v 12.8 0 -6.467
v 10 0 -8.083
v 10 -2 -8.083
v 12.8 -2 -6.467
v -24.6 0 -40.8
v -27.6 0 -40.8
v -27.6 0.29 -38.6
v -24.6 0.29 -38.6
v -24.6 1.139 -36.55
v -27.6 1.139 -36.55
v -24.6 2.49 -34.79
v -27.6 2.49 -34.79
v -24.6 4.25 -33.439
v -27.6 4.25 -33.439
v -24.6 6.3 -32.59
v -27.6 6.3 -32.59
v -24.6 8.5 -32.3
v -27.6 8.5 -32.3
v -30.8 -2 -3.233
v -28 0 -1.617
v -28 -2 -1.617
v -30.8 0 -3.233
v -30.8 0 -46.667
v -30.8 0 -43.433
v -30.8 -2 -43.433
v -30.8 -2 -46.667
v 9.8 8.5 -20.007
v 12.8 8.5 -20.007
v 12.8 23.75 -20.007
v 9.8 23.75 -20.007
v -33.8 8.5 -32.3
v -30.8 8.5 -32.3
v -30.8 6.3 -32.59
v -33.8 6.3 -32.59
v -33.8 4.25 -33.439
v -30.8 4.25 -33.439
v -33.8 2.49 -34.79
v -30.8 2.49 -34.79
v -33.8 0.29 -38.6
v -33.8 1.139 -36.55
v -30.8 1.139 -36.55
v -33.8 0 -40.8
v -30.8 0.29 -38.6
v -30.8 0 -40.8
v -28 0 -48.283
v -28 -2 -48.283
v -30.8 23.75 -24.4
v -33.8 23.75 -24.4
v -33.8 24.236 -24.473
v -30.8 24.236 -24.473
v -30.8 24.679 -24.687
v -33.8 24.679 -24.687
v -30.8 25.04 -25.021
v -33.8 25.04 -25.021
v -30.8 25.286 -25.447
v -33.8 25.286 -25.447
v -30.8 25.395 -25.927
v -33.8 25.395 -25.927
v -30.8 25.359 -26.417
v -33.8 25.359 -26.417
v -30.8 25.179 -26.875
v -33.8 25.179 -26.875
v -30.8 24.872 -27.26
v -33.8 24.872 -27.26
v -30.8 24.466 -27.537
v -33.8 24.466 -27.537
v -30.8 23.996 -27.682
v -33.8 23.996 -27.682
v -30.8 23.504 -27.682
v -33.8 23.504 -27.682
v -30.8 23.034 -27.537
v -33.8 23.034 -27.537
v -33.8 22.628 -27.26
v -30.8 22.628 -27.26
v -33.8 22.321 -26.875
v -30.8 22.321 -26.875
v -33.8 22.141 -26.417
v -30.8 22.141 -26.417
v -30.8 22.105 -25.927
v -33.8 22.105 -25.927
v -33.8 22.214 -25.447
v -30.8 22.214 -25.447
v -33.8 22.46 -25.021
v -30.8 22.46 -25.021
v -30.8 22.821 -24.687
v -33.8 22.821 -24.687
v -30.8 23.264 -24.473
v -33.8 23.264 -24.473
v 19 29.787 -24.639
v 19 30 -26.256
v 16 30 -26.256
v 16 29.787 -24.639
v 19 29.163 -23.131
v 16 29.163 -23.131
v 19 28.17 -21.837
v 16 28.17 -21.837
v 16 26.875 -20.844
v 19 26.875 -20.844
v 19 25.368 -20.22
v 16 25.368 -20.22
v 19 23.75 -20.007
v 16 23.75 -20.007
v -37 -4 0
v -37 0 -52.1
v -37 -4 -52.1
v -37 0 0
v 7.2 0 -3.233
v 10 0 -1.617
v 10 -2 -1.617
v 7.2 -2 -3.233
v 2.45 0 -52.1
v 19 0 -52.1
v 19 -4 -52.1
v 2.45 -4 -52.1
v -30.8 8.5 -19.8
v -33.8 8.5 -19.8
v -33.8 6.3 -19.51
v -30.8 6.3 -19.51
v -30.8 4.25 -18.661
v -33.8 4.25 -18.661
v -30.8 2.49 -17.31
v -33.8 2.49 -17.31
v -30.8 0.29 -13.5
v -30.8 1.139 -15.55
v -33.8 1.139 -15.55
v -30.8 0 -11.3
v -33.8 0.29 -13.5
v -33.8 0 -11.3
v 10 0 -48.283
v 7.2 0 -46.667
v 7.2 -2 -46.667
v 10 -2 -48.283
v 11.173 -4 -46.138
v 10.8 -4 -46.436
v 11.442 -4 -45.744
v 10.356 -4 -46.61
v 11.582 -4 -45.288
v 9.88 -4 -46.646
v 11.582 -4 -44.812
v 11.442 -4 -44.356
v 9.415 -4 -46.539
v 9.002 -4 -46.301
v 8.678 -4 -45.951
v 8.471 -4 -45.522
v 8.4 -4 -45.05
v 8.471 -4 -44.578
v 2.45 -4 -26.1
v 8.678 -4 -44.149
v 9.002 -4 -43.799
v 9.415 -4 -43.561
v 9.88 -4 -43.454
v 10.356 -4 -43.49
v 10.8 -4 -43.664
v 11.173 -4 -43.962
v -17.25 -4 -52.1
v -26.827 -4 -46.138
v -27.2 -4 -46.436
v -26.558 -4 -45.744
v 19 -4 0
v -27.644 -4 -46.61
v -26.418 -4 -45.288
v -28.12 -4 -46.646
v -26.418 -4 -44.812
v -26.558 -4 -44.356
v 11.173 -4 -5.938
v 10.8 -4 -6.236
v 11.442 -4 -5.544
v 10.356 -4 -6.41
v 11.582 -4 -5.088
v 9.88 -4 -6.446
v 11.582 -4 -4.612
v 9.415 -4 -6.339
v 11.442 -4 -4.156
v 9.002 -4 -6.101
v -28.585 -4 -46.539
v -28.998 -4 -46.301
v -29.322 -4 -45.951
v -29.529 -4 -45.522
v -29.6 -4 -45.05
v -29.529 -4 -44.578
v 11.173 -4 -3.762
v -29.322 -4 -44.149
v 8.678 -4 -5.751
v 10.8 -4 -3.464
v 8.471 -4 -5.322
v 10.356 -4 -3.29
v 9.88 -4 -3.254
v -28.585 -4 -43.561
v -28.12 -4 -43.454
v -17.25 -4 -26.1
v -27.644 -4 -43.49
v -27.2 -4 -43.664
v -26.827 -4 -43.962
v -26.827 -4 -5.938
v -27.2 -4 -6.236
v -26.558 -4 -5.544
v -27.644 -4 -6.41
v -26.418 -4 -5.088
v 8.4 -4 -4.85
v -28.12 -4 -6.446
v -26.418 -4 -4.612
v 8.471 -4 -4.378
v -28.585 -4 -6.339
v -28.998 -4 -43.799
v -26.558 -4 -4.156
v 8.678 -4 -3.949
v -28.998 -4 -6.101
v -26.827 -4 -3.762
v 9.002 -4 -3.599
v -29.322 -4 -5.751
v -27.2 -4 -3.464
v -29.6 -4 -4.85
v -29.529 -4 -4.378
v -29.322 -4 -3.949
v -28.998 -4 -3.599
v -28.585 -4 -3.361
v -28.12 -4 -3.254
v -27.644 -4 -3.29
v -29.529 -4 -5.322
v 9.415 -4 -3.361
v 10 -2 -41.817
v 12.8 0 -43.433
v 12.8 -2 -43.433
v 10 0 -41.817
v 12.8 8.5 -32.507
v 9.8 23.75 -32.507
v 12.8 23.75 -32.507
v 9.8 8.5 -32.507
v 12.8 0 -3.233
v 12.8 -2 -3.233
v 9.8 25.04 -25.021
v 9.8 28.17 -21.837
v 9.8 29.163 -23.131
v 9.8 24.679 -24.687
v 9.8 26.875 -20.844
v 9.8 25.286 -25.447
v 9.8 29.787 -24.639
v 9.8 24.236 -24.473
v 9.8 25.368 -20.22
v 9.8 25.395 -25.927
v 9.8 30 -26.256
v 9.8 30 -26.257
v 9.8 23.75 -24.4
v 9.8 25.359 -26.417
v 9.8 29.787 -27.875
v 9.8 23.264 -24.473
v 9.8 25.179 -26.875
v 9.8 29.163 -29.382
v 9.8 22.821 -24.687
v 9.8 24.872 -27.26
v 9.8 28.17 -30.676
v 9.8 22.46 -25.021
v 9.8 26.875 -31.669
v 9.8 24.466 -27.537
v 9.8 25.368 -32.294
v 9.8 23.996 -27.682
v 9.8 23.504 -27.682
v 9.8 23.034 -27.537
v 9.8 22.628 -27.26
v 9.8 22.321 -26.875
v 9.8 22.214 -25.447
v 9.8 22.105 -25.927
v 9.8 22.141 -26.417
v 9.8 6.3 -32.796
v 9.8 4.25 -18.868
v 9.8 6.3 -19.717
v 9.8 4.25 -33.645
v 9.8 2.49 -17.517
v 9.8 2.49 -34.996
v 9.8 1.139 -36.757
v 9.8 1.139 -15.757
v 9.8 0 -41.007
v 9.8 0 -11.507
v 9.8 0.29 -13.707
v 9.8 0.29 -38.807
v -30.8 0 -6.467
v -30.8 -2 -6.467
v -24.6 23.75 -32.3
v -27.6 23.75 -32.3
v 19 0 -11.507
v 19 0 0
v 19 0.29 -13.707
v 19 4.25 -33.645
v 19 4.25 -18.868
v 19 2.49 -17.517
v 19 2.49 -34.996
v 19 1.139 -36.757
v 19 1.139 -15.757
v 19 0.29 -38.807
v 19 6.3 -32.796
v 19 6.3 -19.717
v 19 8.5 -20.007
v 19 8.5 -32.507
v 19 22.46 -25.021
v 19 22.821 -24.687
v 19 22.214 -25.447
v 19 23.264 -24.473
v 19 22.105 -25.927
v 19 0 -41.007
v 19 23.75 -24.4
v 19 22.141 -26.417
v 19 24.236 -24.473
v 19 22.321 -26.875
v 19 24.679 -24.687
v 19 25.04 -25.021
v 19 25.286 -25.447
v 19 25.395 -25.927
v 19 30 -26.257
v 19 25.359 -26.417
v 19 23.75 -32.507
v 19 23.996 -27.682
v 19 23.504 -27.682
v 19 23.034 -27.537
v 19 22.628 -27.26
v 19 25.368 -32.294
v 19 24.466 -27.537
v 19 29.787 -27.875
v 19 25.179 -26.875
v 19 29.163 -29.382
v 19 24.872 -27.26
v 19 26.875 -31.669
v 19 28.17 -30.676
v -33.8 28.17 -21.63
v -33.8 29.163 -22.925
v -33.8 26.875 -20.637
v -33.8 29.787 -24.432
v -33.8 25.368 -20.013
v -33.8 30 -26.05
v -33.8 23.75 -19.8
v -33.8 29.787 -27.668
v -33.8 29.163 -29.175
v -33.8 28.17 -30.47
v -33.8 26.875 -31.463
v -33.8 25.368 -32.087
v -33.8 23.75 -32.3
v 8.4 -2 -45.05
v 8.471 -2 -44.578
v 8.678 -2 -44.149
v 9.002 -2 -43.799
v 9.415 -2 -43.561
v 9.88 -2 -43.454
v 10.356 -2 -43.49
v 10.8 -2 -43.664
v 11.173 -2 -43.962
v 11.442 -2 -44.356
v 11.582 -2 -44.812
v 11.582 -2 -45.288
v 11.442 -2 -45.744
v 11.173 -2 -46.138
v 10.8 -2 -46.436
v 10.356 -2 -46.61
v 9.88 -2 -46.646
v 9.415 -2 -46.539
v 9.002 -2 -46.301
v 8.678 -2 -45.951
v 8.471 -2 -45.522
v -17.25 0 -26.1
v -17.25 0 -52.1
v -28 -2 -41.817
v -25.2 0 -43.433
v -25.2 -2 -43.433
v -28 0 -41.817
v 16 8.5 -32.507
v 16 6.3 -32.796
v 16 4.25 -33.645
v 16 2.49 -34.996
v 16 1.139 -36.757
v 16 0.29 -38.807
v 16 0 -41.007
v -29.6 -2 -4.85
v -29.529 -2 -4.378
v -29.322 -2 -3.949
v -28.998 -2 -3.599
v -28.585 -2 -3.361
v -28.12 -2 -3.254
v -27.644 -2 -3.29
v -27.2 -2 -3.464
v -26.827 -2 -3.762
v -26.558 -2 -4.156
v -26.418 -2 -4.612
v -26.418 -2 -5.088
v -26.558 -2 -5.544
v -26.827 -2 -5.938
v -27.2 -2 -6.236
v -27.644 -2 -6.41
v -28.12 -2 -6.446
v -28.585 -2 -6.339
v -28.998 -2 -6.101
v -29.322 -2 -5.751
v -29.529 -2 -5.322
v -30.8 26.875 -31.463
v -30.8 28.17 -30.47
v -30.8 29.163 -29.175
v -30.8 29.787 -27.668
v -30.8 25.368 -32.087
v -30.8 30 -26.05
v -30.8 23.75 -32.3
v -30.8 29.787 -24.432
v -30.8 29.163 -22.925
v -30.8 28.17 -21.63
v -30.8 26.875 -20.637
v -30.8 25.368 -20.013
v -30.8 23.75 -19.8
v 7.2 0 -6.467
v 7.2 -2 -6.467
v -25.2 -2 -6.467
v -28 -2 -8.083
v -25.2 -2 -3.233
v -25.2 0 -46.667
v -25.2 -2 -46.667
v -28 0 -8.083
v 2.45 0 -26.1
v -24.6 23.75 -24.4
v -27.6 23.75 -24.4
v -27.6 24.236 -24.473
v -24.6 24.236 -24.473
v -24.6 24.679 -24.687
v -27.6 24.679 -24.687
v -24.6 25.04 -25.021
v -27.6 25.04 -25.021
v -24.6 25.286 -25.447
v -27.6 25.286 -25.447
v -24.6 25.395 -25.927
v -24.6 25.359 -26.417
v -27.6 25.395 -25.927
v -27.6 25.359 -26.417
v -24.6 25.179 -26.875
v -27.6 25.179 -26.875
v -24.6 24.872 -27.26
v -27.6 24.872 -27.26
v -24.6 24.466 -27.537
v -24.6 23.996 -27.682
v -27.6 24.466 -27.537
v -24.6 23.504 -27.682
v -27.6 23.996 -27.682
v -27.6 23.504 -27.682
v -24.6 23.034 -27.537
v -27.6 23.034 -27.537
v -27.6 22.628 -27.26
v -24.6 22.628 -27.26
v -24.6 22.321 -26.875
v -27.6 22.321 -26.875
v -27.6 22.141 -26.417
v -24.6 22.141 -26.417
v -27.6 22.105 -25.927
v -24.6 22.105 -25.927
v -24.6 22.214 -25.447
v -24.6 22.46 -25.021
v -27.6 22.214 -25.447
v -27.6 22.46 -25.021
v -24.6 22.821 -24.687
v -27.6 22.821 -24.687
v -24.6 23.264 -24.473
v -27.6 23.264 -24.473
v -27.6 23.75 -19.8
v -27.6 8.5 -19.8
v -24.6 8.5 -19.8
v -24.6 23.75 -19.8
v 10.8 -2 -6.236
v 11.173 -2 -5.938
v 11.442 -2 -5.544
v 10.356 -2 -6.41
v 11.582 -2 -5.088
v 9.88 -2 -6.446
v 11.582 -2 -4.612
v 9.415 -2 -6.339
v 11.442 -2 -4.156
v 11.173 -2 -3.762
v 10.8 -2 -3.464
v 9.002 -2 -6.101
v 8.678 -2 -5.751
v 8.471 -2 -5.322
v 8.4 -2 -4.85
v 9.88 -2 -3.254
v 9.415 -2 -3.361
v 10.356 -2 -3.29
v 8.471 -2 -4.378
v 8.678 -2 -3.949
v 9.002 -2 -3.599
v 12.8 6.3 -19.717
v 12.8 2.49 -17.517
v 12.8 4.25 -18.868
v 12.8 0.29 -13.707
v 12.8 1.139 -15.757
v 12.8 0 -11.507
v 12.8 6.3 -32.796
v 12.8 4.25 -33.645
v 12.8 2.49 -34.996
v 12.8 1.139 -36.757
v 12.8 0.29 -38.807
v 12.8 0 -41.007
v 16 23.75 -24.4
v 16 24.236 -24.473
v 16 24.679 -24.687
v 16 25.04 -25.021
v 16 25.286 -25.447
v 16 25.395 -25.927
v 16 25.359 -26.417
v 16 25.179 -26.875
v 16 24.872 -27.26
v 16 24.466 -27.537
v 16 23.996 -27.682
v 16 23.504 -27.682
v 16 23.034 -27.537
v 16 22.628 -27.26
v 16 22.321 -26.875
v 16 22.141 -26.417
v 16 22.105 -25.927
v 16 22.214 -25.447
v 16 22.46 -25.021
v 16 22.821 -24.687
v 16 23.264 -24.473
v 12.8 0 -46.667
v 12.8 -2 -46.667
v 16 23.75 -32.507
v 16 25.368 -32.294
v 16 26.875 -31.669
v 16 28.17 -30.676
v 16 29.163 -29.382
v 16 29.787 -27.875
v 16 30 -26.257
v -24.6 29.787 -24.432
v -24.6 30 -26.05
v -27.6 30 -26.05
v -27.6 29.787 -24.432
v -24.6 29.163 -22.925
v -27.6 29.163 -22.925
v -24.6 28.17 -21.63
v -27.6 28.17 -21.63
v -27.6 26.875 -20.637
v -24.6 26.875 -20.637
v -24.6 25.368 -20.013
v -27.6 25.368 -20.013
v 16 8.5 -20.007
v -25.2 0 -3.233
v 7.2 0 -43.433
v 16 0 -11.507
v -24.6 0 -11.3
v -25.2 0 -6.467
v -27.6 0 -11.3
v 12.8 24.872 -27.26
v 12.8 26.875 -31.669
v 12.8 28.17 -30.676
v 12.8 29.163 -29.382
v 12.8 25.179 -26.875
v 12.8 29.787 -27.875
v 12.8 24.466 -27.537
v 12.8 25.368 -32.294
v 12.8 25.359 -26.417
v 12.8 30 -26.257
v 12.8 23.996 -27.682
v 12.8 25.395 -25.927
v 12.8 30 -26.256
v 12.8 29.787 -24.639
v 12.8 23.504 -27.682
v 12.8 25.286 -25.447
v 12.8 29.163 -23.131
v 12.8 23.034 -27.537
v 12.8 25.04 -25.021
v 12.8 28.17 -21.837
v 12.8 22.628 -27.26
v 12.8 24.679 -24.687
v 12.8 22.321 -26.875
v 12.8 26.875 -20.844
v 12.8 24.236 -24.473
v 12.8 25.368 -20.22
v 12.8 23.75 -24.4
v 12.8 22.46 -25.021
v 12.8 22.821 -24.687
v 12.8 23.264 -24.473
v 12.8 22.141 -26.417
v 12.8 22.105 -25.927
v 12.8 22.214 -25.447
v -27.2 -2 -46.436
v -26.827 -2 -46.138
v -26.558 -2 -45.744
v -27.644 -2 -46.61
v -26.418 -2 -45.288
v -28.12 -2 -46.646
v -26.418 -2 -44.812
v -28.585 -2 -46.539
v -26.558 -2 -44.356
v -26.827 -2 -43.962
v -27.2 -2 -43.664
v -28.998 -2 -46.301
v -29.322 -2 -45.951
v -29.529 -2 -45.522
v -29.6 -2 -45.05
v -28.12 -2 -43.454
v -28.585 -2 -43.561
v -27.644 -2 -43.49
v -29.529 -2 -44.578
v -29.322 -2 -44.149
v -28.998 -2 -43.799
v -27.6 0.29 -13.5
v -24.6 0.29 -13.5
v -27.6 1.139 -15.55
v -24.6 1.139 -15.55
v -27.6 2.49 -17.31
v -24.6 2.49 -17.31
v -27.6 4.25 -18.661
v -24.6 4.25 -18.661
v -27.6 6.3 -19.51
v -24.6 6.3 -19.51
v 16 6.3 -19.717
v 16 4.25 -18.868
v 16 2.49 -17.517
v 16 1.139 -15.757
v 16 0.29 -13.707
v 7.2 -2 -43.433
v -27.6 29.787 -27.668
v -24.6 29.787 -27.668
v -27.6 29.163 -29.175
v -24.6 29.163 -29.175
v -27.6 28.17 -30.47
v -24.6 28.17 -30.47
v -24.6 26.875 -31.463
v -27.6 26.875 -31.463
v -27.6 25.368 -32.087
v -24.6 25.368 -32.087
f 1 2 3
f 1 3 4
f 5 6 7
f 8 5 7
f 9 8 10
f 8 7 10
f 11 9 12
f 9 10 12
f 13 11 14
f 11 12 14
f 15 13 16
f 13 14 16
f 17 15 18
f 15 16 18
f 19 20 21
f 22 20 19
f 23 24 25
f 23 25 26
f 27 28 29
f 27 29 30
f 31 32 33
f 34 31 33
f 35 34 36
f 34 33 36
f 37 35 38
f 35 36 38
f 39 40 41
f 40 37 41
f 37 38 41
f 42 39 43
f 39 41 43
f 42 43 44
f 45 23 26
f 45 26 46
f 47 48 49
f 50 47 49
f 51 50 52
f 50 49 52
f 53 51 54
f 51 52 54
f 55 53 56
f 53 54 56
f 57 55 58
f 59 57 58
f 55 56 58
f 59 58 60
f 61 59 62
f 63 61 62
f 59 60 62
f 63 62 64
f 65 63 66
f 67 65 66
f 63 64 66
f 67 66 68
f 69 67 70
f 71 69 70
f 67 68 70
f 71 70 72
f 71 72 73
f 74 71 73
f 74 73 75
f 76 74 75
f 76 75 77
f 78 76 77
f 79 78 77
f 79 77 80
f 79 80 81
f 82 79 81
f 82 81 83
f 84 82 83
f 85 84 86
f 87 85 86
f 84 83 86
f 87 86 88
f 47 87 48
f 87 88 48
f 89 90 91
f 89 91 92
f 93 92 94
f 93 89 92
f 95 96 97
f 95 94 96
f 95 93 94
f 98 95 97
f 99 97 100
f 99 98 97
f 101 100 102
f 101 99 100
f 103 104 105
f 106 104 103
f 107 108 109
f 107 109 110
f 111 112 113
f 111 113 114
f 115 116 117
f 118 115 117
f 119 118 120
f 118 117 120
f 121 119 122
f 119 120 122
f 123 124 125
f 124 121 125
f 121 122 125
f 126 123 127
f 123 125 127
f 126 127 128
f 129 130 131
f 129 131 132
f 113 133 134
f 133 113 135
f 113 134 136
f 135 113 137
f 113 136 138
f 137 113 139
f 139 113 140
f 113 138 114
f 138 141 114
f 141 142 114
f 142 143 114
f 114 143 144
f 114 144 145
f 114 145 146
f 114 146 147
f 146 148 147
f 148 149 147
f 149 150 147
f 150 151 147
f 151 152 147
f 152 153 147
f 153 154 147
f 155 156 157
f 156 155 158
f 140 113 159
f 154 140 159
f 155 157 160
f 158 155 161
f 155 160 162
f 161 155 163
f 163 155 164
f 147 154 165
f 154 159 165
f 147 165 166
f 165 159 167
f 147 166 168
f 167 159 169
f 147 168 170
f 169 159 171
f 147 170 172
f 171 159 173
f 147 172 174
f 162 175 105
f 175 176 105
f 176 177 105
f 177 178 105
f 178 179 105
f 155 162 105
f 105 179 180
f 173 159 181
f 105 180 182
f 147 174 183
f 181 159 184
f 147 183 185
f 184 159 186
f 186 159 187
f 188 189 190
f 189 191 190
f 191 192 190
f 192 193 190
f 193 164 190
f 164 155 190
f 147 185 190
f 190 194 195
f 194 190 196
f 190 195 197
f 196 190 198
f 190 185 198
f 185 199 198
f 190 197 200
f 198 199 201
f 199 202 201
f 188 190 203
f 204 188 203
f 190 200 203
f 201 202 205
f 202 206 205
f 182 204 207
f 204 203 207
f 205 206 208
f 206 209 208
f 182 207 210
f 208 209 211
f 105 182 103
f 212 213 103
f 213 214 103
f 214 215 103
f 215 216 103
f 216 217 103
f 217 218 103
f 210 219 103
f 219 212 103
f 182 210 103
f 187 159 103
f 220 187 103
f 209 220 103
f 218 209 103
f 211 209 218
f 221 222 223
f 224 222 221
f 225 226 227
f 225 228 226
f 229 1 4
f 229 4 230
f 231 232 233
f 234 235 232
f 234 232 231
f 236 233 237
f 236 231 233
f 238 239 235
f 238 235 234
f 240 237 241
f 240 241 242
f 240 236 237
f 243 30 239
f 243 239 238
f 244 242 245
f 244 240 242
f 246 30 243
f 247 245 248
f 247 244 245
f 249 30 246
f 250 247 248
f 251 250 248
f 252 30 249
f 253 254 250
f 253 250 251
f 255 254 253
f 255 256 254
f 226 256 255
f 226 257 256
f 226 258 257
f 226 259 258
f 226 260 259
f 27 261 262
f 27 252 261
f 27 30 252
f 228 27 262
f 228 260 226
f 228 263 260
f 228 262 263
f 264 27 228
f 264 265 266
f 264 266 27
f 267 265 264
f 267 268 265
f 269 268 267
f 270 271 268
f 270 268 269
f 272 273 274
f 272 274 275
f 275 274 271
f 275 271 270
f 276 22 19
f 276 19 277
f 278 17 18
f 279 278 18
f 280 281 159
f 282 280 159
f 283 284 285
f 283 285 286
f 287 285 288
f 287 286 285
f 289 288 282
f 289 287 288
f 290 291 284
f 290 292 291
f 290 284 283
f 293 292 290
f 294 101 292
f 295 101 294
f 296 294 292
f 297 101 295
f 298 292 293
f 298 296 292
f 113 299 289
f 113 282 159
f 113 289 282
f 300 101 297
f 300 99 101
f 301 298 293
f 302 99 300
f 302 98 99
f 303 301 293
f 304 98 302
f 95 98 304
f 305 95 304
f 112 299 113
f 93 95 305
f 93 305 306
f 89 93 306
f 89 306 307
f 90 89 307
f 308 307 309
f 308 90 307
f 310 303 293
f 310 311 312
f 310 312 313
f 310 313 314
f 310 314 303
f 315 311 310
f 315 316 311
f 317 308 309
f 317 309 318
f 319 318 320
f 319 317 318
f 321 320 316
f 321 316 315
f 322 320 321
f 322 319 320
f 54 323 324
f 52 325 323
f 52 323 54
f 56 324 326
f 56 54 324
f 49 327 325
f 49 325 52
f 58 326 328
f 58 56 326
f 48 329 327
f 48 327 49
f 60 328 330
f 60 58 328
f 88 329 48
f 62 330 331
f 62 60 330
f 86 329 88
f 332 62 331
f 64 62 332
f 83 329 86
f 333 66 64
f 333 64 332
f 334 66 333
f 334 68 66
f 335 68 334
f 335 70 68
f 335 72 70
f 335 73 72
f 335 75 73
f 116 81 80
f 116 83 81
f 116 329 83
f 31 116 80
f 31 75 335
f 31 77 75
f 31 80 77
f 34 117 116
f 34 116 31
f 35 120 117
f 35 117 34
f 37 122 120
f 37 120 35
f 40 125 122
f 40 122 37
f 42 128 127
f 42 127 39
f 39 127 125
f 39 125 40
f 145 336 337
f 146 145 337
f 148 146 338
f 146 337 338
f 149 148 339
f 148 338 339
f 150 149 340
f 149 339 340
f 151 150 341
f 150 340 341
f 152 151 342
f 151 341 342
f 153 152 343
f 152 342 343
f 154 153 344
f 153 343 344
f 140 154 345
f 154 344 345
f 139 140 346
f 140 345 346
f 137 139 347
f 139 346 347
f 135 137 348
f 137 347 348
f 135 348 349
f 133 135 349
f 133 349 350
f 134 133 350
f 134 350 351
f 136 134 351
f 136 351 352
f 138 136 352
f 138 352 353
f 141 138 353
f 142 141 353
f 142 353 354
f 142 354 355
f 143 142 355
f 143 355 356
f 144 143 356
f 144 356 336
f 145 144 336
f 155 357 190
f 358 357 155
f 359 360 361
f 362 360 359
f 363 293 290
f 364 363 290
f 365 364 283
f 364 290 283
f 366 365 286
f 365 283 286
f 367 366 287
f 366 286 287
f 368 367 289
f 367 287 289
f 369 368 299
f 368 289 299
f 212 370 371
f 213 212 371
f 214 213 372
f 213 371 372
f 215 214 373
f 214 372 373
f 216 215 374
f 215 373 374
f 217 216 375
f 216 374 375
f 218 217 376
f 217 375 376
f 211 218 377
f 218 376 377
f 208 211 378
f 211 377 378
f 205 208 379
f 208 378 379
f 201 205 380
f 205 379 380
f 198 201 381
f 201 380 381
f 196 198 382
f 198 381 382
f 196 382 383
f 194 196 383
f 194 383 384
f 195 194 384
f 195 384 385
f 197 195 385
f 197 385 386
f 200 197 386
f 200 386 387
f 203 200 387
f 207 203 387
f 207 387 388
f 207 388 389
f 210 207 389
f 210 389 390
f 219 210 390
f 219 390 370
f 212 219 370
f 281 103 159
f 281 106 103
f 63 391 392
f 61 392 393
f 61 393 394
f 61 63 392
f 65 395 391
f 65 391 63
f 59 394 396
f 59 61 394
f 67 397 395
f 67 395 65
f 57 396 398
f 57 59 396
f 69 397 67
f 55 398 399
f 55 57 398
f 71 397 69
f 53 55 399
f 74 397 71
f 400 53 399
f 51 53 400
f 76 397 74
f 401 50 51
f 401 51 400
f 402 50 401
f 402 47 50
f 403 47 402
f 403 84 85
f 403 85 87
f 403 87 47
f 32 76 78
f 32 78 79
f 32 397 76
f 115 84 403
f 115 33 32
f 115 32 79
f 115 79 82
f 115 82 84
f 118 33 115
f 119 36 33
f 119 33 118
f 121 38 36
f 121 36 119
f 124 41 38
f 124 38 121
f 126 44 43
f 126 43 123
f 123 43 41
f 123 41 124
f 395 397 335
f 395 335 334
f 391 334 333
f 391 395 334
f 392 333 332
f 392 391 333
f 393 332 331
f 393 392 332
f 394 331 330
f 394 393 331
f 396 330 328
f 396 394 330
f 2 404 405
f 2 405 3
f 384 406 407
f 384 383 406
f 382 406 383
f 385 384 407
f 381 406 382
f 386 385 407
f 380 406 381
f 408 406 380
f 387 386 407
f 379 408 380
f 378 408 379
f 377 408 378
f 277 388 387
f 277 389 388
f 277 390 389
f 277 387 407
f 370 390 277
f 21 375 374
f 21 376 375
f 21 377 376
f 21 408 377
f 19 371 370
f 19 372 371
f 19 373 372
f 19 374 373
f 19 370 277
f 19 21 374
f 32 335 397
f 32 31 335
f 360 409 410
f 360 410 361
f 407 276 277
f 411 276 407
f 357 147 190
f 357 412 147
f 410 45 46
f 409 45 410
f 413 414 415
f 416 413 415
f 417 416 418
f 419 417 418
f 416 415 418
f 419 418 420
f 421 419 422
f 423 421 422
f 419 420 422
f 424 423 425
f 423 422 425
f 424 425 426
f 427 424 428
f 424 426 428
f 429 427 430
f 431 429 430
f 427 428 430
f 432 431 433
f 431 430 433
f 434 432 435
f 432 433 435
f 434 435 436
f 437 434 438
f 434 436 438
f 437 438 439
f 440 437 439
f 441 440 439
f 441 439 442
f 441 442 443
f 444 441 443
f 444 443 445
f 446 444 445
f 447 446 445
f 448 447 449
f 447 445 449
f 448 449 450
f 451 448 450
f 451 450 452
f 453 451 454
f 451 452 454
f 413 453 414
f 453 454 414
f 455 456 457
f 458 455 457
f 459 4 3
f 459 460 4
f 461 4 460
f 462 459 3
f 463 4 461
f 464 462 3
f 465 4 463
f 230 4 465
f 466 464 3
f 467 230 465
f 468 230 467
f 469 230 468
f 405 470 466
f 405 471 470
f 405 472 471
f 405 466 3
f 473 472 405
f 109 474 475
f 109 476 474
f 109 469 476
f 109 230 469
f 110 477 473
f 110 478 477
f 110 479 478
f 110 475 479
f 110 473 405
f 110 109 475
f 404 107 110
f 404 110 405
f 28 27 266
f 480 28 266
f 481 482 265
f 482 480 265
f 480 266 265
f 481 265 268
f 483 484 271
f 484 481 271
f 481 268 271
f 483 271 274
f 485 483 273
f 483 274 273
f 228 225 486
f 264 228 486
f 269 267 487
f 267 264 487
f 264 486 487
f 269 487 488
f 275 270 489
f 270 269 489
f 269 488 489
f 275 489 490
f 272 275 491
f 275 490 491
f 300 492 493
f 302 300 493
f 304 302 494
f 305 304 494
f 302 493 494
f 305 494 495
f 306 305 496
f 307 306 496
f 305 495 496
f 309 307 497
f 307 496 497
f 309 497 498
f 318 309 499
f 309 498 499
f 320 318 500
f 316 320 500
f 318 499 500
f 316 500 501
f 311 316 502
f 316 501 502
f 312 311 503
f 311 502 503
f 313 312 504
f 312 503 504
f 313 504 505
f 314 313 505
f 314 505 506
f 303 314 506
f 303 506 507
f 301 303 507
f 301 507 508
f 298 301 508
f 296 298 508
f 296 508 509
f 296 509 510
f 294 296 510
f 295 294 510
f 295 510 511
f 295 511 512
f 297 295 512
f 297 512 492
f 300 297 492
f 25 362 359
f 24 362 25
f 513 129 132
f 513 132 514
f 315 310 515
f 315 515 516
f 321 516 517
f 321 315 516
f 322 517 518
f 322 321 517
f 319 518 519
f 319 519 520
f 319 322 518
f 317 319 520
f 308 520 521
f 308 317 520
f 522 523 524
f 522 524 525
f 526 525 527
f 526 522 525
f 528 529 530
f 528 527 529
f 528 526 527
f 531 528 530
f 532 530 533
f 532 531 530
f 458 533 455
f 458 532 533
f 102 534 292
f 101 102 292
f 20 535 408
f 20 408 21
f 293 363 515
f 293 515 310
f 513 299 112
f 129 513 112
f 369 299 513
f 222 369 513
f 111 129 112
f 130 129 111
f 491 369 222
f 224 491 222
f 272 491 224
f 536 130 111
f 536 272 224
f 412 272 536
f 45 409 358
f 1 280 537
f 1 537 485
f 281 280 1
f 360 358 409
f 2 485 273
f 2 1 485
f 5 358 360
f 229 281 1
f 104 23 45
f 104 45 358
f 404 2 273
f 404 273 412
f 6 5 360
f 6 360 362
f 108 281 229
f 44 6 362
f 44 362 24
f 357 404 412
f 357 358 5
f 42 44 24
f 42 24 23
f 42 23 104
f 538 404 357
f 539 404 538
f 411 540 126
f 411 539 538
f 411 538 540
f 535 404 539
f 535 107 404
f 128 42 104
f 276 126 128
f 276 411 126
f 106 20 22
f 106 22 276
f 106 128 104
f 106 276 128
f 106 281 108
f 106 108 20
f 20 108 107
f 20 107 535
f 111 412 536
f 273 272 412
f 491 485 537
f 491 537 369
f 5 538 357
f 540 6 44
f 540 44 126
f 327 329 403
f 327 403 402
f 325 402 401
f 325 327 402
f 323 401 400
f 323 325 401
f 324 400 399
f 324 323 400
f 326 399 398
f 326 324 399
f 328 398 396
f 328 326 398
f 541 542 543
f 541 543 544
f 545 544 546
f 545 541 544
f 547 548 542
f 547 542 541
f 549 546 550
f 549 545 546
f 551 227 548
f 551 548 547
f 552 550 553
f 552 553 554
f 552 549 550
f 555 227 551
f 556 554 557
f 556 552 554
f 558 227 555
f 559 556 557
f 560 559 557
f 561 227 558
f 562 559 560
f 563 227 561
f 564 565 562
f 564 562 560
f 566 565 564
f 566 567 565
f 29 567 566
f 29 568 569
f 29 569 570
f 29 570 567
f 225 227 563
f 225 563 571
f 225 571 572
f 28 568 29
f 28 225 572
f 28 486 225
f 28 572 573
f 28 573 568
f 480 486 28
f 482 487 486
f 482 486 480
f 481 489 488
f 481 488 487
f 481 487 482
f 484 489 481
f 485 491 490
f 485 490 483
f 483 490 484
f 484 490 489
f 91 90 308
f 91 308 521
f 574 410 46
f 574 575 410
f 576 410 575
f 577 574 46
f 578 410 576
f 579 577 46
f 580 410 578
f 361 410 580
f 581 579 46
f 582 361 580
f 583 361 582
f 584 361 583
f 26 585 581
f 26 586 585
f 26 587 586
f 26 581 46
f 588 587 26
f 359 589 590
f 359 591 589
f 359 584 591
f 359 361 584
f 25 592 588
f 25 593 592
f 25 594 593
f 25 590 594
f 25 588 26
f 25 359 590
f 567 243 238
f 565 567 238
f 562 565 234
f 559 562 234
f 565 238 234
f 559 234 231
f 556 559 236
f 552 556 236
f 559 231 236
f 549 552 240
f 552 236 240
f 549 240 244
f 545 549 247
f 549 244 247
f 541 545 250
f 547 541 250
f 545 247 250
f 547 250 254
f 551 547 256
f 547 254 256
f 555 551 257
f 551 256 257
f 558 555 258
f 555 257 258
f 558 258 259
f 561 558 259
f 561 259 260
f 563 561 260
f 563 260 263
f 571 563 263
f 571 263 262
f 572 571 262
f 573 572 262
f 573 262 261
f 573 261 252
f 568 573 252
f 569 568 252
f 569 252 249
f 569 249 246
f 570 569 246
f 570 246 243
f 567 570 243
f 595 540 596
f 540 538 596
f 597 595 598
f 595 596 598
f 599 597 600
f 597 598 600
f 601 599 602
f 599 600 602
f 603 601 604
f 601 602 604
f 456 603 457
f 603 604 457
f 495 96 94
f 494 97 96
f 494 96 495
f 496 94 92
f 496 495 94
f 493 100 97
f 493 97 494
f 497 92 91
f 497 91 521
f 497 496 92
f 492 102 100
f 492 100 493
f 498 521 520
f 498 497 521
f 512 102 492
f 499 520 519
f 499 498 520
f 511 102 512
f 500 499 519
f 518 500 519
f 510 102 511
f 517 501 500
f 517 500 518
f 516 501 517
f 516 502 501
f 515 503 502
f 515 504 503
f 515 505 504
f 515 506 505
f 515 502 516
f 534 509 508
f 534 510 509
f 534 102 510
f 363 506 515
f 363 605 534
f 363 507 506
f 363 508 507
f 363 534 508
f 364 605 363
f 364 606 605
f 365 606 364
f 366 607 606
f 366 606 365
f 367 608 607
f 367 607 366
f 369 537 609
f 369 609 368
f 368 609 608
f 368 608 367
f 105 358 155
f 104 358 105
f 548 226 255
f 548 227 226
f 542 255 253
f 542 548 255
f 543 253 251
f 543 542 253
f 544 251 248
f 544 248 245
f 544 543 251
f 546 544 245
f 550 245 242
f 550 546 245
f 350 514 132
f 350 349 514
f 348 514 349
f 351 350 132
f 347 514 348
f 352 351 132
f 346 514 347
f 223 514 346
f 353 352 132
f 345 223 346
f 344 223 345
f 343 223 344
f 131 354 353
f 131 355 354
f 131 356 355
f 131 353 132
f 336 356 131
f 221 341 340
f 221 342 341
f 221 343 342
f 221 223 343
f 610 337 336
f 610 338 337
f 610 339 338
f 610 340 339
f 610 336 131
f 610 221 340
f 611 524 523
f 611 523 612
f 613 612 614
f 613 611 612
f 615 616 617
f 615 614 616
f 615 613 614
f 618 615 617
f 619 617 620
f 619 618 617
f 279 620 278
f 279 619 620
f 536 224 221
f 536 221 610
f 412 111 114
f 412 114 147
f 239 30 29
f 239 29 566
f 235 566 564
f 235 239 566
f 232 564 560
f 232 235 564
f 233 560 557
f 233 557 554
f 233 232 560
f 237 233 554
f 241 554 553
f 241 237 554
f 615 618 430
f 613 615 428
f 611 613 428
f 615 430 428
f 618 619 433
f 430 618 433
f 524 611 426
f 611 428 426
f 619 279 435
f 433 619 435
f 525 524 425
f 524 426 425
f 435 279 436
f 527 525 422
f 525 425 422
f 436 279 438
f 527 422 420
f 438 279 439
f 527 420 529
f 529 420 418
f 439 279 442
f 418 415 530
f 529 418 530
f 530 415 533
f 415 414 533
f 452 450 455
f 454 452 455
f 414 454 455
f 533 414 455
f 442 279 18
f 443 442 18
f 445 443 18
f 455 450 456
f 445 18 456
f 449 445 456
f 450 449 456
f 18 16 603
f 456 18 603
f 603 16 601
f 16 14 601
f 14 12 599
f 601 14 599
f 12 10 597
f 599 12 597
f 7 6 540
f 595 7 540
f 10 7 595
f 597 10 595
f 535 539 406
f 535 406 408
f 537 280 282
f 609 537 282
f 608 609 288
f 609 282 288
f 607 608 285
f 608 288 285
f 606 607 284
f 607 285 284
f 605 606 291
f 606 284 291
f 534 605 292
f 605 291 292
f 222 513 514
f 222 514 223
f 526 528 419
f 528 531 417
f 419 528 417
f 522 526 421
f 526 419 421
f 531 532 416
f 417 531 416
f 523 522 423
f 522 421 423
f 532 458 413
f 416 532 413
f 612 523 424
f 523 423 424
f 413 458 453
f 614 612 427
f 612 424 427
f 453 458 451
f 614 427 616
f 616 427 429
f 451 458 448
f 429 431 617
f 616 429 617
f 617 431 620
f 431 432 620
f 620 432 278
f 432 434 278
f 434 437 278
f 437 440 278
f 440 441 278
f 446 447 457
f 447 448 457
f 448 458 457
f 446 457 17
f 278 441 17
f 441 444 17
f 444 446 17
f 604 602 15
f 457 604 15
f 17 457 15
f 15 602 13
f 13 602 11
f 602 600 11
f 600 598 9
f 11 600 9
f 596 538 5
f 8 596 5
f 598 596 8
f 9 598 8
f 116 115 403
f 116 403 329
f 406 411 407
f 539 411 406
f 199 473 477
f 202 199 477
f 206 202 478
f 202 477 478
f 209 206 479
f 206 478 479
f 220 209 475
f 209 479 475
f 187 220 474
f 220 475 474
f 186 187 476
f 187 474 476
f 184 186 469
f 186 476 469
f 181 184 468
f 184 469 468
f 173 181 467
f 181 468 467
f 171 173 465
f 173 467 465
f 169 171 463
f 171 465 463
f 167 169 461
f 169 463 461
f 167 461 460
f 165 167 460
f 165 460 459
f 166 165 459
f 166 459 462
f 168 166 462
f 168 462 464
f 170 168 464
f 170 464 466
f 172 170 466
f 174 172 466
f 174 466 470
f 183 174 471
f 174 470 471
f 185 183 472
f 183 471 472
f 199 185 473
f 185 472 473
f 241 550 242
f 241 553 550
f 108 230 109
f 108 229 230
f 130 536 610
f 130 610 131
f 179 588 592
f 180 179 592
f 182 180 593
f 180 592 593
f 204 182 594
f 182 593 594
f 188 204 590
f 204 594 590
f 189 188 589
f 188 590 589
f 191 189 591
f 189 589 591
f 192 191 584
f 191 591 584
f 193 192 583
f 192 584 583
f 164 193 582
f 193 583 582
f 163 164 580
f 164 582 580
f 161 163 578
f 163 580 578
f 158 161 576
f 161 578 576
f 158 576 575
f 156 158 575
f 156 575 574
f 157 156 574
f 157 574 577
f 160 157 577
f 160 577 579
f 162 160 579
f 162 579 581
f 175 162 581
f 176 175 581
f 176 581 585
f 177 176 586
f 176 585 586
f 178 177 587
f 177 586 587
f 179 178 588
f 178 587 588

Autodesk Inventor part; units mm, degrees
ref_plane "YZ Plane" through (0, 0, 0) normal (1, 0, 0) x (0, 1, 0)
ref_plane "XZ Plane" through (0, 0, 0) normal (0, 1, 0) x (-1, 0, 0)
ref_plane "XY Plane" through (0, 0, 0) normal (0, 0, 1) x (1, 0, 0)
sketch "Sketch1" plane through (0, 0, 0) normal (0, 1, 0) x (-1, 0, 0)
  circle A0 centre (28, -4.85) radius 1.6
  line L0 (28, -8.0832) -> (25.2, -6.4666)
  line L1 (25.2, -6.4666) -> (25.2, -3.2334)
  line L2 (25.2, -3.2334) -> (28, -1.6168)
  line L3 (28, -1.6168) -> (30.8, -3.2334)
  line L4 (30.8, -3.2334) -> (30.8, -6.4666)
  line L5 (30.8, -6.4666) -> (28, -8.0832)
  line L6 (-16, -20.0067) -> (-16, -32.5067)
  line L7 (37, -52.1) -> (37, 0)
  line L8 (-16, -32.5067) -> (-19, -32.5067)
  line L9 (-16, -20.0067) -> (-19, -20.0067)
  line L10 (-12.8, -32.5067) -> (-12.8, -20.0067)
  line L11 (-12.8, -20.0067) -> (-9.8, -20.0067)
  line L12 (-9.8, -20.0067) -> (-9.8, -32.5067)
  line L13 (-9.8, -32.5067) -> (-12.8, -32.5067)
  line L14 (33.8, -32.3) -> (30.8, -32.3)
  line L15 (30.8, -32.3) -> (30.8, -19.8)
  line L16 (30.8, -19.8) -> (33.8, -19.8)
  line L17 (33.8, -19.8) -> (33.8, -32.3)
  line L18 (27.6, -32.3) -> (27.6, -19.8)
  line L19 (27.6, -19.8) -> (24.6, -19.8)
  line L20 (24.6, -19.8) -> (24.6, -32.3)
  line L21 (24.6, -32.3) -> (27.6, -32.3)
  line L22 (-19, -20.0067) -> (-19, -32.5067)
  line L23 (37, 0) -> (-19, 0)
  line L24 (-19, 0) -> (-19, -52.1)
  line L25 (-19, -52.1) -> (37, -52.1)
  circle A1 centre (-10, -4.85) radius 1.6
  line L26 (-10, -8.0832) -> (-12.8, -6.4666)
  line L27 (-12.8, -6.4666) -> (-12.8, -3.2334)
  line L28 (-12.8, -3.2334) -> (-10, -1.6168)
  line L29 (-10, -1.6168) -> (-7.2, -3.2334)
  line L30 (-7.2, -3.2334) -> (-7.2, -6.4666)
  line L31 (-7.2, -6.4666) -> (-10, -8.0832)
  circle A2 centre (-10, -45.05) radius 1.6
  line L32 (-10, -48.2832) -> (-12.8, -46.6666)
  line L33 (-7.2, -46.6666) -> (-10, -48.2832)
  line L34 (-7.2, -43.4334) -> (-7.2, -46.6666)
  line L35 (-12.8, -46.6666) -> (-12.8, -43.4334)
  line L36 (-10, -41.8168) -> (-7.2, -43.4334)
  line L37 (-12.8, -43.4334) -> (-10, -41.8168)
  line L38 (30.8, -46.6666) -> (28, -48.2832)
  line L39 (28, -48.2832) -> (25.2, -46.6666)
  circle A3 centre (28, -45.05) radius 1.6
  line L40 (30.8, -43.4334) -> (30.8, -46.6666)
  line L41 (28, -41.8168) -> (30.8, -43.4334)
  line L42 (25.2, -46.6666) -> (25.2, -43.4334)
  line L43 (25.2, -43.4334) -> (28, -41.8168)
  line L44 (-2.45, -26.1) -> (17.25, -26.1)
  line L45 (17.25, -26.1) -> (17.25, -52.1)
  line L46 (17.25, -52.1) -> (-2.45, -52.1)
  line L47 (-2.45, -52.1) -> (-2.45, -26.1)
  point P0 (-17.5, -20.0067)
  point P1 (26.1, -19.8)
  point P2 (-11.3, -20.0067)
  point P3 (32.3, -32.3)
  point P4 (30.8, -4.85)
  point P5 (-7.2, -4.85)
  point P6 (-7.2, -45.05)
  point P7 (30.8, -45.05)
  point P8 (-12.8, -45.05)
  dimension "d2" = 3.2
  dimension "d5" = 5.6
  dimension "d63" = 3.2
  dimension "d64" = 3
  dimension "d65" = 3
  dimension "d67" = 12.5
  dimension "d69" = 3.2
  dimension "d70" = 3.2
  dimension "d71" = 12.5
  dimension "d121" = 3.2
  dimension "d122" = 5.6
  dimension "d123" = 4.85
  dimension "d124" = 4.85
  dimension "d126" = 6.2
  dimension "d128" = 3.2
  dimension "d129" = 5.6
  dimension "d130" = 3.2
  dimension "d131" = 5.6
  dimension "d133" = 56
  dimension "d137" = 7.05
  dimension "d138" = 52.1
  dimension "d139" = 40.2
  dimension "d140" = 7.05
  dimension "d141" = 6.2
  dimension "d143" = 19.7
  dimension "d144" = 26
  dimension "d147" = 0
  dimension "d148" = 34.4
  dimension "d149" = 7.35
  dimension "d150" = 16.55
  dimension "d161" = 6.2
  dimension "d163" = 6.2
extrude "Extrusão6" add sketch "Sketch1" against normal blind 4 contours A0 | L0 L1 L2 L3 L4 L5 | L9 L24 L23 L7 L25 L45 L44 L47 L8 L6 | L6 L8 L22 L9 | L47 L44 L45 L25 | L10 L11 L12 L13 | L14 L15 L16 L17 | L21 L20 L19 L18 | A1 | L26 L27 L28 L29 L30 L31 | A2 | L32 L35 L37 L36 L34 L33 | L38 L39 L42 L43 L41 L40 | A3
extrude "Extrusão7" add sketch "Sketch1" along normal blind 30 contours L6 L8 L22 L9 | L10 L11 L12 L13 | L14 L15 L16 L17 | L21 L20 L19 L18
fillet "Arredondamento5" radius 6.25 8 edges at (17.5, 30, -20.0067) (17.5, 30, -32.5067) (11.3, 30, -32.5067) (11.3, 30, -20.0067) (-26.1, 30, -19.8) (-26.1, 30, -32.3) (-32.3, 30, -32.3) (-32.3, 30, -19.8)
fillet "Arredondamento7" radius 8.5 8 edges at (17.5, 0, -32.5067) (11.3, 0, -32.5067) (-26.1, 0, -32.3) (-32.3, 0, -32.3) (-32.3, 0, -19.8) (-26.1, 0, -19.8) (11.3, 0, -20.0067) (17.5, 0, -20.0067)
extrude "Extrusão13" cut sketch "Sketch1" against normal blind 10 contours L47 L44 L45 L25
extrude "Extrusão14" cut sketch "Sketch1" against normal blind 10 contours A0 | A1 | A2 | A3
extrude "Extrusão15" cut sketch "Sketch1" against normal blind 2 contours L0 L1 L2 L3 L4 L5 | A1 | L26 L27 L28 L29 L30 L31 | L32 L35 L37 L36 L34 L33 | L38 L39 L42 L43 L41 L40 | A3
sketch "Esboço4" plane through (-33.8, 23.75, -26.05) normal (-1, 0, 0) x (0, 0, 1)
  circle A0 centre (0, 0) radius 1.65
  point P0 (26.05, -23.75)
  dimension "d158" = 3.3
extrude "Extrusão16" cut sketch "Esboço4" against normal blind 100
properties part number "encaixeDuplo3"
